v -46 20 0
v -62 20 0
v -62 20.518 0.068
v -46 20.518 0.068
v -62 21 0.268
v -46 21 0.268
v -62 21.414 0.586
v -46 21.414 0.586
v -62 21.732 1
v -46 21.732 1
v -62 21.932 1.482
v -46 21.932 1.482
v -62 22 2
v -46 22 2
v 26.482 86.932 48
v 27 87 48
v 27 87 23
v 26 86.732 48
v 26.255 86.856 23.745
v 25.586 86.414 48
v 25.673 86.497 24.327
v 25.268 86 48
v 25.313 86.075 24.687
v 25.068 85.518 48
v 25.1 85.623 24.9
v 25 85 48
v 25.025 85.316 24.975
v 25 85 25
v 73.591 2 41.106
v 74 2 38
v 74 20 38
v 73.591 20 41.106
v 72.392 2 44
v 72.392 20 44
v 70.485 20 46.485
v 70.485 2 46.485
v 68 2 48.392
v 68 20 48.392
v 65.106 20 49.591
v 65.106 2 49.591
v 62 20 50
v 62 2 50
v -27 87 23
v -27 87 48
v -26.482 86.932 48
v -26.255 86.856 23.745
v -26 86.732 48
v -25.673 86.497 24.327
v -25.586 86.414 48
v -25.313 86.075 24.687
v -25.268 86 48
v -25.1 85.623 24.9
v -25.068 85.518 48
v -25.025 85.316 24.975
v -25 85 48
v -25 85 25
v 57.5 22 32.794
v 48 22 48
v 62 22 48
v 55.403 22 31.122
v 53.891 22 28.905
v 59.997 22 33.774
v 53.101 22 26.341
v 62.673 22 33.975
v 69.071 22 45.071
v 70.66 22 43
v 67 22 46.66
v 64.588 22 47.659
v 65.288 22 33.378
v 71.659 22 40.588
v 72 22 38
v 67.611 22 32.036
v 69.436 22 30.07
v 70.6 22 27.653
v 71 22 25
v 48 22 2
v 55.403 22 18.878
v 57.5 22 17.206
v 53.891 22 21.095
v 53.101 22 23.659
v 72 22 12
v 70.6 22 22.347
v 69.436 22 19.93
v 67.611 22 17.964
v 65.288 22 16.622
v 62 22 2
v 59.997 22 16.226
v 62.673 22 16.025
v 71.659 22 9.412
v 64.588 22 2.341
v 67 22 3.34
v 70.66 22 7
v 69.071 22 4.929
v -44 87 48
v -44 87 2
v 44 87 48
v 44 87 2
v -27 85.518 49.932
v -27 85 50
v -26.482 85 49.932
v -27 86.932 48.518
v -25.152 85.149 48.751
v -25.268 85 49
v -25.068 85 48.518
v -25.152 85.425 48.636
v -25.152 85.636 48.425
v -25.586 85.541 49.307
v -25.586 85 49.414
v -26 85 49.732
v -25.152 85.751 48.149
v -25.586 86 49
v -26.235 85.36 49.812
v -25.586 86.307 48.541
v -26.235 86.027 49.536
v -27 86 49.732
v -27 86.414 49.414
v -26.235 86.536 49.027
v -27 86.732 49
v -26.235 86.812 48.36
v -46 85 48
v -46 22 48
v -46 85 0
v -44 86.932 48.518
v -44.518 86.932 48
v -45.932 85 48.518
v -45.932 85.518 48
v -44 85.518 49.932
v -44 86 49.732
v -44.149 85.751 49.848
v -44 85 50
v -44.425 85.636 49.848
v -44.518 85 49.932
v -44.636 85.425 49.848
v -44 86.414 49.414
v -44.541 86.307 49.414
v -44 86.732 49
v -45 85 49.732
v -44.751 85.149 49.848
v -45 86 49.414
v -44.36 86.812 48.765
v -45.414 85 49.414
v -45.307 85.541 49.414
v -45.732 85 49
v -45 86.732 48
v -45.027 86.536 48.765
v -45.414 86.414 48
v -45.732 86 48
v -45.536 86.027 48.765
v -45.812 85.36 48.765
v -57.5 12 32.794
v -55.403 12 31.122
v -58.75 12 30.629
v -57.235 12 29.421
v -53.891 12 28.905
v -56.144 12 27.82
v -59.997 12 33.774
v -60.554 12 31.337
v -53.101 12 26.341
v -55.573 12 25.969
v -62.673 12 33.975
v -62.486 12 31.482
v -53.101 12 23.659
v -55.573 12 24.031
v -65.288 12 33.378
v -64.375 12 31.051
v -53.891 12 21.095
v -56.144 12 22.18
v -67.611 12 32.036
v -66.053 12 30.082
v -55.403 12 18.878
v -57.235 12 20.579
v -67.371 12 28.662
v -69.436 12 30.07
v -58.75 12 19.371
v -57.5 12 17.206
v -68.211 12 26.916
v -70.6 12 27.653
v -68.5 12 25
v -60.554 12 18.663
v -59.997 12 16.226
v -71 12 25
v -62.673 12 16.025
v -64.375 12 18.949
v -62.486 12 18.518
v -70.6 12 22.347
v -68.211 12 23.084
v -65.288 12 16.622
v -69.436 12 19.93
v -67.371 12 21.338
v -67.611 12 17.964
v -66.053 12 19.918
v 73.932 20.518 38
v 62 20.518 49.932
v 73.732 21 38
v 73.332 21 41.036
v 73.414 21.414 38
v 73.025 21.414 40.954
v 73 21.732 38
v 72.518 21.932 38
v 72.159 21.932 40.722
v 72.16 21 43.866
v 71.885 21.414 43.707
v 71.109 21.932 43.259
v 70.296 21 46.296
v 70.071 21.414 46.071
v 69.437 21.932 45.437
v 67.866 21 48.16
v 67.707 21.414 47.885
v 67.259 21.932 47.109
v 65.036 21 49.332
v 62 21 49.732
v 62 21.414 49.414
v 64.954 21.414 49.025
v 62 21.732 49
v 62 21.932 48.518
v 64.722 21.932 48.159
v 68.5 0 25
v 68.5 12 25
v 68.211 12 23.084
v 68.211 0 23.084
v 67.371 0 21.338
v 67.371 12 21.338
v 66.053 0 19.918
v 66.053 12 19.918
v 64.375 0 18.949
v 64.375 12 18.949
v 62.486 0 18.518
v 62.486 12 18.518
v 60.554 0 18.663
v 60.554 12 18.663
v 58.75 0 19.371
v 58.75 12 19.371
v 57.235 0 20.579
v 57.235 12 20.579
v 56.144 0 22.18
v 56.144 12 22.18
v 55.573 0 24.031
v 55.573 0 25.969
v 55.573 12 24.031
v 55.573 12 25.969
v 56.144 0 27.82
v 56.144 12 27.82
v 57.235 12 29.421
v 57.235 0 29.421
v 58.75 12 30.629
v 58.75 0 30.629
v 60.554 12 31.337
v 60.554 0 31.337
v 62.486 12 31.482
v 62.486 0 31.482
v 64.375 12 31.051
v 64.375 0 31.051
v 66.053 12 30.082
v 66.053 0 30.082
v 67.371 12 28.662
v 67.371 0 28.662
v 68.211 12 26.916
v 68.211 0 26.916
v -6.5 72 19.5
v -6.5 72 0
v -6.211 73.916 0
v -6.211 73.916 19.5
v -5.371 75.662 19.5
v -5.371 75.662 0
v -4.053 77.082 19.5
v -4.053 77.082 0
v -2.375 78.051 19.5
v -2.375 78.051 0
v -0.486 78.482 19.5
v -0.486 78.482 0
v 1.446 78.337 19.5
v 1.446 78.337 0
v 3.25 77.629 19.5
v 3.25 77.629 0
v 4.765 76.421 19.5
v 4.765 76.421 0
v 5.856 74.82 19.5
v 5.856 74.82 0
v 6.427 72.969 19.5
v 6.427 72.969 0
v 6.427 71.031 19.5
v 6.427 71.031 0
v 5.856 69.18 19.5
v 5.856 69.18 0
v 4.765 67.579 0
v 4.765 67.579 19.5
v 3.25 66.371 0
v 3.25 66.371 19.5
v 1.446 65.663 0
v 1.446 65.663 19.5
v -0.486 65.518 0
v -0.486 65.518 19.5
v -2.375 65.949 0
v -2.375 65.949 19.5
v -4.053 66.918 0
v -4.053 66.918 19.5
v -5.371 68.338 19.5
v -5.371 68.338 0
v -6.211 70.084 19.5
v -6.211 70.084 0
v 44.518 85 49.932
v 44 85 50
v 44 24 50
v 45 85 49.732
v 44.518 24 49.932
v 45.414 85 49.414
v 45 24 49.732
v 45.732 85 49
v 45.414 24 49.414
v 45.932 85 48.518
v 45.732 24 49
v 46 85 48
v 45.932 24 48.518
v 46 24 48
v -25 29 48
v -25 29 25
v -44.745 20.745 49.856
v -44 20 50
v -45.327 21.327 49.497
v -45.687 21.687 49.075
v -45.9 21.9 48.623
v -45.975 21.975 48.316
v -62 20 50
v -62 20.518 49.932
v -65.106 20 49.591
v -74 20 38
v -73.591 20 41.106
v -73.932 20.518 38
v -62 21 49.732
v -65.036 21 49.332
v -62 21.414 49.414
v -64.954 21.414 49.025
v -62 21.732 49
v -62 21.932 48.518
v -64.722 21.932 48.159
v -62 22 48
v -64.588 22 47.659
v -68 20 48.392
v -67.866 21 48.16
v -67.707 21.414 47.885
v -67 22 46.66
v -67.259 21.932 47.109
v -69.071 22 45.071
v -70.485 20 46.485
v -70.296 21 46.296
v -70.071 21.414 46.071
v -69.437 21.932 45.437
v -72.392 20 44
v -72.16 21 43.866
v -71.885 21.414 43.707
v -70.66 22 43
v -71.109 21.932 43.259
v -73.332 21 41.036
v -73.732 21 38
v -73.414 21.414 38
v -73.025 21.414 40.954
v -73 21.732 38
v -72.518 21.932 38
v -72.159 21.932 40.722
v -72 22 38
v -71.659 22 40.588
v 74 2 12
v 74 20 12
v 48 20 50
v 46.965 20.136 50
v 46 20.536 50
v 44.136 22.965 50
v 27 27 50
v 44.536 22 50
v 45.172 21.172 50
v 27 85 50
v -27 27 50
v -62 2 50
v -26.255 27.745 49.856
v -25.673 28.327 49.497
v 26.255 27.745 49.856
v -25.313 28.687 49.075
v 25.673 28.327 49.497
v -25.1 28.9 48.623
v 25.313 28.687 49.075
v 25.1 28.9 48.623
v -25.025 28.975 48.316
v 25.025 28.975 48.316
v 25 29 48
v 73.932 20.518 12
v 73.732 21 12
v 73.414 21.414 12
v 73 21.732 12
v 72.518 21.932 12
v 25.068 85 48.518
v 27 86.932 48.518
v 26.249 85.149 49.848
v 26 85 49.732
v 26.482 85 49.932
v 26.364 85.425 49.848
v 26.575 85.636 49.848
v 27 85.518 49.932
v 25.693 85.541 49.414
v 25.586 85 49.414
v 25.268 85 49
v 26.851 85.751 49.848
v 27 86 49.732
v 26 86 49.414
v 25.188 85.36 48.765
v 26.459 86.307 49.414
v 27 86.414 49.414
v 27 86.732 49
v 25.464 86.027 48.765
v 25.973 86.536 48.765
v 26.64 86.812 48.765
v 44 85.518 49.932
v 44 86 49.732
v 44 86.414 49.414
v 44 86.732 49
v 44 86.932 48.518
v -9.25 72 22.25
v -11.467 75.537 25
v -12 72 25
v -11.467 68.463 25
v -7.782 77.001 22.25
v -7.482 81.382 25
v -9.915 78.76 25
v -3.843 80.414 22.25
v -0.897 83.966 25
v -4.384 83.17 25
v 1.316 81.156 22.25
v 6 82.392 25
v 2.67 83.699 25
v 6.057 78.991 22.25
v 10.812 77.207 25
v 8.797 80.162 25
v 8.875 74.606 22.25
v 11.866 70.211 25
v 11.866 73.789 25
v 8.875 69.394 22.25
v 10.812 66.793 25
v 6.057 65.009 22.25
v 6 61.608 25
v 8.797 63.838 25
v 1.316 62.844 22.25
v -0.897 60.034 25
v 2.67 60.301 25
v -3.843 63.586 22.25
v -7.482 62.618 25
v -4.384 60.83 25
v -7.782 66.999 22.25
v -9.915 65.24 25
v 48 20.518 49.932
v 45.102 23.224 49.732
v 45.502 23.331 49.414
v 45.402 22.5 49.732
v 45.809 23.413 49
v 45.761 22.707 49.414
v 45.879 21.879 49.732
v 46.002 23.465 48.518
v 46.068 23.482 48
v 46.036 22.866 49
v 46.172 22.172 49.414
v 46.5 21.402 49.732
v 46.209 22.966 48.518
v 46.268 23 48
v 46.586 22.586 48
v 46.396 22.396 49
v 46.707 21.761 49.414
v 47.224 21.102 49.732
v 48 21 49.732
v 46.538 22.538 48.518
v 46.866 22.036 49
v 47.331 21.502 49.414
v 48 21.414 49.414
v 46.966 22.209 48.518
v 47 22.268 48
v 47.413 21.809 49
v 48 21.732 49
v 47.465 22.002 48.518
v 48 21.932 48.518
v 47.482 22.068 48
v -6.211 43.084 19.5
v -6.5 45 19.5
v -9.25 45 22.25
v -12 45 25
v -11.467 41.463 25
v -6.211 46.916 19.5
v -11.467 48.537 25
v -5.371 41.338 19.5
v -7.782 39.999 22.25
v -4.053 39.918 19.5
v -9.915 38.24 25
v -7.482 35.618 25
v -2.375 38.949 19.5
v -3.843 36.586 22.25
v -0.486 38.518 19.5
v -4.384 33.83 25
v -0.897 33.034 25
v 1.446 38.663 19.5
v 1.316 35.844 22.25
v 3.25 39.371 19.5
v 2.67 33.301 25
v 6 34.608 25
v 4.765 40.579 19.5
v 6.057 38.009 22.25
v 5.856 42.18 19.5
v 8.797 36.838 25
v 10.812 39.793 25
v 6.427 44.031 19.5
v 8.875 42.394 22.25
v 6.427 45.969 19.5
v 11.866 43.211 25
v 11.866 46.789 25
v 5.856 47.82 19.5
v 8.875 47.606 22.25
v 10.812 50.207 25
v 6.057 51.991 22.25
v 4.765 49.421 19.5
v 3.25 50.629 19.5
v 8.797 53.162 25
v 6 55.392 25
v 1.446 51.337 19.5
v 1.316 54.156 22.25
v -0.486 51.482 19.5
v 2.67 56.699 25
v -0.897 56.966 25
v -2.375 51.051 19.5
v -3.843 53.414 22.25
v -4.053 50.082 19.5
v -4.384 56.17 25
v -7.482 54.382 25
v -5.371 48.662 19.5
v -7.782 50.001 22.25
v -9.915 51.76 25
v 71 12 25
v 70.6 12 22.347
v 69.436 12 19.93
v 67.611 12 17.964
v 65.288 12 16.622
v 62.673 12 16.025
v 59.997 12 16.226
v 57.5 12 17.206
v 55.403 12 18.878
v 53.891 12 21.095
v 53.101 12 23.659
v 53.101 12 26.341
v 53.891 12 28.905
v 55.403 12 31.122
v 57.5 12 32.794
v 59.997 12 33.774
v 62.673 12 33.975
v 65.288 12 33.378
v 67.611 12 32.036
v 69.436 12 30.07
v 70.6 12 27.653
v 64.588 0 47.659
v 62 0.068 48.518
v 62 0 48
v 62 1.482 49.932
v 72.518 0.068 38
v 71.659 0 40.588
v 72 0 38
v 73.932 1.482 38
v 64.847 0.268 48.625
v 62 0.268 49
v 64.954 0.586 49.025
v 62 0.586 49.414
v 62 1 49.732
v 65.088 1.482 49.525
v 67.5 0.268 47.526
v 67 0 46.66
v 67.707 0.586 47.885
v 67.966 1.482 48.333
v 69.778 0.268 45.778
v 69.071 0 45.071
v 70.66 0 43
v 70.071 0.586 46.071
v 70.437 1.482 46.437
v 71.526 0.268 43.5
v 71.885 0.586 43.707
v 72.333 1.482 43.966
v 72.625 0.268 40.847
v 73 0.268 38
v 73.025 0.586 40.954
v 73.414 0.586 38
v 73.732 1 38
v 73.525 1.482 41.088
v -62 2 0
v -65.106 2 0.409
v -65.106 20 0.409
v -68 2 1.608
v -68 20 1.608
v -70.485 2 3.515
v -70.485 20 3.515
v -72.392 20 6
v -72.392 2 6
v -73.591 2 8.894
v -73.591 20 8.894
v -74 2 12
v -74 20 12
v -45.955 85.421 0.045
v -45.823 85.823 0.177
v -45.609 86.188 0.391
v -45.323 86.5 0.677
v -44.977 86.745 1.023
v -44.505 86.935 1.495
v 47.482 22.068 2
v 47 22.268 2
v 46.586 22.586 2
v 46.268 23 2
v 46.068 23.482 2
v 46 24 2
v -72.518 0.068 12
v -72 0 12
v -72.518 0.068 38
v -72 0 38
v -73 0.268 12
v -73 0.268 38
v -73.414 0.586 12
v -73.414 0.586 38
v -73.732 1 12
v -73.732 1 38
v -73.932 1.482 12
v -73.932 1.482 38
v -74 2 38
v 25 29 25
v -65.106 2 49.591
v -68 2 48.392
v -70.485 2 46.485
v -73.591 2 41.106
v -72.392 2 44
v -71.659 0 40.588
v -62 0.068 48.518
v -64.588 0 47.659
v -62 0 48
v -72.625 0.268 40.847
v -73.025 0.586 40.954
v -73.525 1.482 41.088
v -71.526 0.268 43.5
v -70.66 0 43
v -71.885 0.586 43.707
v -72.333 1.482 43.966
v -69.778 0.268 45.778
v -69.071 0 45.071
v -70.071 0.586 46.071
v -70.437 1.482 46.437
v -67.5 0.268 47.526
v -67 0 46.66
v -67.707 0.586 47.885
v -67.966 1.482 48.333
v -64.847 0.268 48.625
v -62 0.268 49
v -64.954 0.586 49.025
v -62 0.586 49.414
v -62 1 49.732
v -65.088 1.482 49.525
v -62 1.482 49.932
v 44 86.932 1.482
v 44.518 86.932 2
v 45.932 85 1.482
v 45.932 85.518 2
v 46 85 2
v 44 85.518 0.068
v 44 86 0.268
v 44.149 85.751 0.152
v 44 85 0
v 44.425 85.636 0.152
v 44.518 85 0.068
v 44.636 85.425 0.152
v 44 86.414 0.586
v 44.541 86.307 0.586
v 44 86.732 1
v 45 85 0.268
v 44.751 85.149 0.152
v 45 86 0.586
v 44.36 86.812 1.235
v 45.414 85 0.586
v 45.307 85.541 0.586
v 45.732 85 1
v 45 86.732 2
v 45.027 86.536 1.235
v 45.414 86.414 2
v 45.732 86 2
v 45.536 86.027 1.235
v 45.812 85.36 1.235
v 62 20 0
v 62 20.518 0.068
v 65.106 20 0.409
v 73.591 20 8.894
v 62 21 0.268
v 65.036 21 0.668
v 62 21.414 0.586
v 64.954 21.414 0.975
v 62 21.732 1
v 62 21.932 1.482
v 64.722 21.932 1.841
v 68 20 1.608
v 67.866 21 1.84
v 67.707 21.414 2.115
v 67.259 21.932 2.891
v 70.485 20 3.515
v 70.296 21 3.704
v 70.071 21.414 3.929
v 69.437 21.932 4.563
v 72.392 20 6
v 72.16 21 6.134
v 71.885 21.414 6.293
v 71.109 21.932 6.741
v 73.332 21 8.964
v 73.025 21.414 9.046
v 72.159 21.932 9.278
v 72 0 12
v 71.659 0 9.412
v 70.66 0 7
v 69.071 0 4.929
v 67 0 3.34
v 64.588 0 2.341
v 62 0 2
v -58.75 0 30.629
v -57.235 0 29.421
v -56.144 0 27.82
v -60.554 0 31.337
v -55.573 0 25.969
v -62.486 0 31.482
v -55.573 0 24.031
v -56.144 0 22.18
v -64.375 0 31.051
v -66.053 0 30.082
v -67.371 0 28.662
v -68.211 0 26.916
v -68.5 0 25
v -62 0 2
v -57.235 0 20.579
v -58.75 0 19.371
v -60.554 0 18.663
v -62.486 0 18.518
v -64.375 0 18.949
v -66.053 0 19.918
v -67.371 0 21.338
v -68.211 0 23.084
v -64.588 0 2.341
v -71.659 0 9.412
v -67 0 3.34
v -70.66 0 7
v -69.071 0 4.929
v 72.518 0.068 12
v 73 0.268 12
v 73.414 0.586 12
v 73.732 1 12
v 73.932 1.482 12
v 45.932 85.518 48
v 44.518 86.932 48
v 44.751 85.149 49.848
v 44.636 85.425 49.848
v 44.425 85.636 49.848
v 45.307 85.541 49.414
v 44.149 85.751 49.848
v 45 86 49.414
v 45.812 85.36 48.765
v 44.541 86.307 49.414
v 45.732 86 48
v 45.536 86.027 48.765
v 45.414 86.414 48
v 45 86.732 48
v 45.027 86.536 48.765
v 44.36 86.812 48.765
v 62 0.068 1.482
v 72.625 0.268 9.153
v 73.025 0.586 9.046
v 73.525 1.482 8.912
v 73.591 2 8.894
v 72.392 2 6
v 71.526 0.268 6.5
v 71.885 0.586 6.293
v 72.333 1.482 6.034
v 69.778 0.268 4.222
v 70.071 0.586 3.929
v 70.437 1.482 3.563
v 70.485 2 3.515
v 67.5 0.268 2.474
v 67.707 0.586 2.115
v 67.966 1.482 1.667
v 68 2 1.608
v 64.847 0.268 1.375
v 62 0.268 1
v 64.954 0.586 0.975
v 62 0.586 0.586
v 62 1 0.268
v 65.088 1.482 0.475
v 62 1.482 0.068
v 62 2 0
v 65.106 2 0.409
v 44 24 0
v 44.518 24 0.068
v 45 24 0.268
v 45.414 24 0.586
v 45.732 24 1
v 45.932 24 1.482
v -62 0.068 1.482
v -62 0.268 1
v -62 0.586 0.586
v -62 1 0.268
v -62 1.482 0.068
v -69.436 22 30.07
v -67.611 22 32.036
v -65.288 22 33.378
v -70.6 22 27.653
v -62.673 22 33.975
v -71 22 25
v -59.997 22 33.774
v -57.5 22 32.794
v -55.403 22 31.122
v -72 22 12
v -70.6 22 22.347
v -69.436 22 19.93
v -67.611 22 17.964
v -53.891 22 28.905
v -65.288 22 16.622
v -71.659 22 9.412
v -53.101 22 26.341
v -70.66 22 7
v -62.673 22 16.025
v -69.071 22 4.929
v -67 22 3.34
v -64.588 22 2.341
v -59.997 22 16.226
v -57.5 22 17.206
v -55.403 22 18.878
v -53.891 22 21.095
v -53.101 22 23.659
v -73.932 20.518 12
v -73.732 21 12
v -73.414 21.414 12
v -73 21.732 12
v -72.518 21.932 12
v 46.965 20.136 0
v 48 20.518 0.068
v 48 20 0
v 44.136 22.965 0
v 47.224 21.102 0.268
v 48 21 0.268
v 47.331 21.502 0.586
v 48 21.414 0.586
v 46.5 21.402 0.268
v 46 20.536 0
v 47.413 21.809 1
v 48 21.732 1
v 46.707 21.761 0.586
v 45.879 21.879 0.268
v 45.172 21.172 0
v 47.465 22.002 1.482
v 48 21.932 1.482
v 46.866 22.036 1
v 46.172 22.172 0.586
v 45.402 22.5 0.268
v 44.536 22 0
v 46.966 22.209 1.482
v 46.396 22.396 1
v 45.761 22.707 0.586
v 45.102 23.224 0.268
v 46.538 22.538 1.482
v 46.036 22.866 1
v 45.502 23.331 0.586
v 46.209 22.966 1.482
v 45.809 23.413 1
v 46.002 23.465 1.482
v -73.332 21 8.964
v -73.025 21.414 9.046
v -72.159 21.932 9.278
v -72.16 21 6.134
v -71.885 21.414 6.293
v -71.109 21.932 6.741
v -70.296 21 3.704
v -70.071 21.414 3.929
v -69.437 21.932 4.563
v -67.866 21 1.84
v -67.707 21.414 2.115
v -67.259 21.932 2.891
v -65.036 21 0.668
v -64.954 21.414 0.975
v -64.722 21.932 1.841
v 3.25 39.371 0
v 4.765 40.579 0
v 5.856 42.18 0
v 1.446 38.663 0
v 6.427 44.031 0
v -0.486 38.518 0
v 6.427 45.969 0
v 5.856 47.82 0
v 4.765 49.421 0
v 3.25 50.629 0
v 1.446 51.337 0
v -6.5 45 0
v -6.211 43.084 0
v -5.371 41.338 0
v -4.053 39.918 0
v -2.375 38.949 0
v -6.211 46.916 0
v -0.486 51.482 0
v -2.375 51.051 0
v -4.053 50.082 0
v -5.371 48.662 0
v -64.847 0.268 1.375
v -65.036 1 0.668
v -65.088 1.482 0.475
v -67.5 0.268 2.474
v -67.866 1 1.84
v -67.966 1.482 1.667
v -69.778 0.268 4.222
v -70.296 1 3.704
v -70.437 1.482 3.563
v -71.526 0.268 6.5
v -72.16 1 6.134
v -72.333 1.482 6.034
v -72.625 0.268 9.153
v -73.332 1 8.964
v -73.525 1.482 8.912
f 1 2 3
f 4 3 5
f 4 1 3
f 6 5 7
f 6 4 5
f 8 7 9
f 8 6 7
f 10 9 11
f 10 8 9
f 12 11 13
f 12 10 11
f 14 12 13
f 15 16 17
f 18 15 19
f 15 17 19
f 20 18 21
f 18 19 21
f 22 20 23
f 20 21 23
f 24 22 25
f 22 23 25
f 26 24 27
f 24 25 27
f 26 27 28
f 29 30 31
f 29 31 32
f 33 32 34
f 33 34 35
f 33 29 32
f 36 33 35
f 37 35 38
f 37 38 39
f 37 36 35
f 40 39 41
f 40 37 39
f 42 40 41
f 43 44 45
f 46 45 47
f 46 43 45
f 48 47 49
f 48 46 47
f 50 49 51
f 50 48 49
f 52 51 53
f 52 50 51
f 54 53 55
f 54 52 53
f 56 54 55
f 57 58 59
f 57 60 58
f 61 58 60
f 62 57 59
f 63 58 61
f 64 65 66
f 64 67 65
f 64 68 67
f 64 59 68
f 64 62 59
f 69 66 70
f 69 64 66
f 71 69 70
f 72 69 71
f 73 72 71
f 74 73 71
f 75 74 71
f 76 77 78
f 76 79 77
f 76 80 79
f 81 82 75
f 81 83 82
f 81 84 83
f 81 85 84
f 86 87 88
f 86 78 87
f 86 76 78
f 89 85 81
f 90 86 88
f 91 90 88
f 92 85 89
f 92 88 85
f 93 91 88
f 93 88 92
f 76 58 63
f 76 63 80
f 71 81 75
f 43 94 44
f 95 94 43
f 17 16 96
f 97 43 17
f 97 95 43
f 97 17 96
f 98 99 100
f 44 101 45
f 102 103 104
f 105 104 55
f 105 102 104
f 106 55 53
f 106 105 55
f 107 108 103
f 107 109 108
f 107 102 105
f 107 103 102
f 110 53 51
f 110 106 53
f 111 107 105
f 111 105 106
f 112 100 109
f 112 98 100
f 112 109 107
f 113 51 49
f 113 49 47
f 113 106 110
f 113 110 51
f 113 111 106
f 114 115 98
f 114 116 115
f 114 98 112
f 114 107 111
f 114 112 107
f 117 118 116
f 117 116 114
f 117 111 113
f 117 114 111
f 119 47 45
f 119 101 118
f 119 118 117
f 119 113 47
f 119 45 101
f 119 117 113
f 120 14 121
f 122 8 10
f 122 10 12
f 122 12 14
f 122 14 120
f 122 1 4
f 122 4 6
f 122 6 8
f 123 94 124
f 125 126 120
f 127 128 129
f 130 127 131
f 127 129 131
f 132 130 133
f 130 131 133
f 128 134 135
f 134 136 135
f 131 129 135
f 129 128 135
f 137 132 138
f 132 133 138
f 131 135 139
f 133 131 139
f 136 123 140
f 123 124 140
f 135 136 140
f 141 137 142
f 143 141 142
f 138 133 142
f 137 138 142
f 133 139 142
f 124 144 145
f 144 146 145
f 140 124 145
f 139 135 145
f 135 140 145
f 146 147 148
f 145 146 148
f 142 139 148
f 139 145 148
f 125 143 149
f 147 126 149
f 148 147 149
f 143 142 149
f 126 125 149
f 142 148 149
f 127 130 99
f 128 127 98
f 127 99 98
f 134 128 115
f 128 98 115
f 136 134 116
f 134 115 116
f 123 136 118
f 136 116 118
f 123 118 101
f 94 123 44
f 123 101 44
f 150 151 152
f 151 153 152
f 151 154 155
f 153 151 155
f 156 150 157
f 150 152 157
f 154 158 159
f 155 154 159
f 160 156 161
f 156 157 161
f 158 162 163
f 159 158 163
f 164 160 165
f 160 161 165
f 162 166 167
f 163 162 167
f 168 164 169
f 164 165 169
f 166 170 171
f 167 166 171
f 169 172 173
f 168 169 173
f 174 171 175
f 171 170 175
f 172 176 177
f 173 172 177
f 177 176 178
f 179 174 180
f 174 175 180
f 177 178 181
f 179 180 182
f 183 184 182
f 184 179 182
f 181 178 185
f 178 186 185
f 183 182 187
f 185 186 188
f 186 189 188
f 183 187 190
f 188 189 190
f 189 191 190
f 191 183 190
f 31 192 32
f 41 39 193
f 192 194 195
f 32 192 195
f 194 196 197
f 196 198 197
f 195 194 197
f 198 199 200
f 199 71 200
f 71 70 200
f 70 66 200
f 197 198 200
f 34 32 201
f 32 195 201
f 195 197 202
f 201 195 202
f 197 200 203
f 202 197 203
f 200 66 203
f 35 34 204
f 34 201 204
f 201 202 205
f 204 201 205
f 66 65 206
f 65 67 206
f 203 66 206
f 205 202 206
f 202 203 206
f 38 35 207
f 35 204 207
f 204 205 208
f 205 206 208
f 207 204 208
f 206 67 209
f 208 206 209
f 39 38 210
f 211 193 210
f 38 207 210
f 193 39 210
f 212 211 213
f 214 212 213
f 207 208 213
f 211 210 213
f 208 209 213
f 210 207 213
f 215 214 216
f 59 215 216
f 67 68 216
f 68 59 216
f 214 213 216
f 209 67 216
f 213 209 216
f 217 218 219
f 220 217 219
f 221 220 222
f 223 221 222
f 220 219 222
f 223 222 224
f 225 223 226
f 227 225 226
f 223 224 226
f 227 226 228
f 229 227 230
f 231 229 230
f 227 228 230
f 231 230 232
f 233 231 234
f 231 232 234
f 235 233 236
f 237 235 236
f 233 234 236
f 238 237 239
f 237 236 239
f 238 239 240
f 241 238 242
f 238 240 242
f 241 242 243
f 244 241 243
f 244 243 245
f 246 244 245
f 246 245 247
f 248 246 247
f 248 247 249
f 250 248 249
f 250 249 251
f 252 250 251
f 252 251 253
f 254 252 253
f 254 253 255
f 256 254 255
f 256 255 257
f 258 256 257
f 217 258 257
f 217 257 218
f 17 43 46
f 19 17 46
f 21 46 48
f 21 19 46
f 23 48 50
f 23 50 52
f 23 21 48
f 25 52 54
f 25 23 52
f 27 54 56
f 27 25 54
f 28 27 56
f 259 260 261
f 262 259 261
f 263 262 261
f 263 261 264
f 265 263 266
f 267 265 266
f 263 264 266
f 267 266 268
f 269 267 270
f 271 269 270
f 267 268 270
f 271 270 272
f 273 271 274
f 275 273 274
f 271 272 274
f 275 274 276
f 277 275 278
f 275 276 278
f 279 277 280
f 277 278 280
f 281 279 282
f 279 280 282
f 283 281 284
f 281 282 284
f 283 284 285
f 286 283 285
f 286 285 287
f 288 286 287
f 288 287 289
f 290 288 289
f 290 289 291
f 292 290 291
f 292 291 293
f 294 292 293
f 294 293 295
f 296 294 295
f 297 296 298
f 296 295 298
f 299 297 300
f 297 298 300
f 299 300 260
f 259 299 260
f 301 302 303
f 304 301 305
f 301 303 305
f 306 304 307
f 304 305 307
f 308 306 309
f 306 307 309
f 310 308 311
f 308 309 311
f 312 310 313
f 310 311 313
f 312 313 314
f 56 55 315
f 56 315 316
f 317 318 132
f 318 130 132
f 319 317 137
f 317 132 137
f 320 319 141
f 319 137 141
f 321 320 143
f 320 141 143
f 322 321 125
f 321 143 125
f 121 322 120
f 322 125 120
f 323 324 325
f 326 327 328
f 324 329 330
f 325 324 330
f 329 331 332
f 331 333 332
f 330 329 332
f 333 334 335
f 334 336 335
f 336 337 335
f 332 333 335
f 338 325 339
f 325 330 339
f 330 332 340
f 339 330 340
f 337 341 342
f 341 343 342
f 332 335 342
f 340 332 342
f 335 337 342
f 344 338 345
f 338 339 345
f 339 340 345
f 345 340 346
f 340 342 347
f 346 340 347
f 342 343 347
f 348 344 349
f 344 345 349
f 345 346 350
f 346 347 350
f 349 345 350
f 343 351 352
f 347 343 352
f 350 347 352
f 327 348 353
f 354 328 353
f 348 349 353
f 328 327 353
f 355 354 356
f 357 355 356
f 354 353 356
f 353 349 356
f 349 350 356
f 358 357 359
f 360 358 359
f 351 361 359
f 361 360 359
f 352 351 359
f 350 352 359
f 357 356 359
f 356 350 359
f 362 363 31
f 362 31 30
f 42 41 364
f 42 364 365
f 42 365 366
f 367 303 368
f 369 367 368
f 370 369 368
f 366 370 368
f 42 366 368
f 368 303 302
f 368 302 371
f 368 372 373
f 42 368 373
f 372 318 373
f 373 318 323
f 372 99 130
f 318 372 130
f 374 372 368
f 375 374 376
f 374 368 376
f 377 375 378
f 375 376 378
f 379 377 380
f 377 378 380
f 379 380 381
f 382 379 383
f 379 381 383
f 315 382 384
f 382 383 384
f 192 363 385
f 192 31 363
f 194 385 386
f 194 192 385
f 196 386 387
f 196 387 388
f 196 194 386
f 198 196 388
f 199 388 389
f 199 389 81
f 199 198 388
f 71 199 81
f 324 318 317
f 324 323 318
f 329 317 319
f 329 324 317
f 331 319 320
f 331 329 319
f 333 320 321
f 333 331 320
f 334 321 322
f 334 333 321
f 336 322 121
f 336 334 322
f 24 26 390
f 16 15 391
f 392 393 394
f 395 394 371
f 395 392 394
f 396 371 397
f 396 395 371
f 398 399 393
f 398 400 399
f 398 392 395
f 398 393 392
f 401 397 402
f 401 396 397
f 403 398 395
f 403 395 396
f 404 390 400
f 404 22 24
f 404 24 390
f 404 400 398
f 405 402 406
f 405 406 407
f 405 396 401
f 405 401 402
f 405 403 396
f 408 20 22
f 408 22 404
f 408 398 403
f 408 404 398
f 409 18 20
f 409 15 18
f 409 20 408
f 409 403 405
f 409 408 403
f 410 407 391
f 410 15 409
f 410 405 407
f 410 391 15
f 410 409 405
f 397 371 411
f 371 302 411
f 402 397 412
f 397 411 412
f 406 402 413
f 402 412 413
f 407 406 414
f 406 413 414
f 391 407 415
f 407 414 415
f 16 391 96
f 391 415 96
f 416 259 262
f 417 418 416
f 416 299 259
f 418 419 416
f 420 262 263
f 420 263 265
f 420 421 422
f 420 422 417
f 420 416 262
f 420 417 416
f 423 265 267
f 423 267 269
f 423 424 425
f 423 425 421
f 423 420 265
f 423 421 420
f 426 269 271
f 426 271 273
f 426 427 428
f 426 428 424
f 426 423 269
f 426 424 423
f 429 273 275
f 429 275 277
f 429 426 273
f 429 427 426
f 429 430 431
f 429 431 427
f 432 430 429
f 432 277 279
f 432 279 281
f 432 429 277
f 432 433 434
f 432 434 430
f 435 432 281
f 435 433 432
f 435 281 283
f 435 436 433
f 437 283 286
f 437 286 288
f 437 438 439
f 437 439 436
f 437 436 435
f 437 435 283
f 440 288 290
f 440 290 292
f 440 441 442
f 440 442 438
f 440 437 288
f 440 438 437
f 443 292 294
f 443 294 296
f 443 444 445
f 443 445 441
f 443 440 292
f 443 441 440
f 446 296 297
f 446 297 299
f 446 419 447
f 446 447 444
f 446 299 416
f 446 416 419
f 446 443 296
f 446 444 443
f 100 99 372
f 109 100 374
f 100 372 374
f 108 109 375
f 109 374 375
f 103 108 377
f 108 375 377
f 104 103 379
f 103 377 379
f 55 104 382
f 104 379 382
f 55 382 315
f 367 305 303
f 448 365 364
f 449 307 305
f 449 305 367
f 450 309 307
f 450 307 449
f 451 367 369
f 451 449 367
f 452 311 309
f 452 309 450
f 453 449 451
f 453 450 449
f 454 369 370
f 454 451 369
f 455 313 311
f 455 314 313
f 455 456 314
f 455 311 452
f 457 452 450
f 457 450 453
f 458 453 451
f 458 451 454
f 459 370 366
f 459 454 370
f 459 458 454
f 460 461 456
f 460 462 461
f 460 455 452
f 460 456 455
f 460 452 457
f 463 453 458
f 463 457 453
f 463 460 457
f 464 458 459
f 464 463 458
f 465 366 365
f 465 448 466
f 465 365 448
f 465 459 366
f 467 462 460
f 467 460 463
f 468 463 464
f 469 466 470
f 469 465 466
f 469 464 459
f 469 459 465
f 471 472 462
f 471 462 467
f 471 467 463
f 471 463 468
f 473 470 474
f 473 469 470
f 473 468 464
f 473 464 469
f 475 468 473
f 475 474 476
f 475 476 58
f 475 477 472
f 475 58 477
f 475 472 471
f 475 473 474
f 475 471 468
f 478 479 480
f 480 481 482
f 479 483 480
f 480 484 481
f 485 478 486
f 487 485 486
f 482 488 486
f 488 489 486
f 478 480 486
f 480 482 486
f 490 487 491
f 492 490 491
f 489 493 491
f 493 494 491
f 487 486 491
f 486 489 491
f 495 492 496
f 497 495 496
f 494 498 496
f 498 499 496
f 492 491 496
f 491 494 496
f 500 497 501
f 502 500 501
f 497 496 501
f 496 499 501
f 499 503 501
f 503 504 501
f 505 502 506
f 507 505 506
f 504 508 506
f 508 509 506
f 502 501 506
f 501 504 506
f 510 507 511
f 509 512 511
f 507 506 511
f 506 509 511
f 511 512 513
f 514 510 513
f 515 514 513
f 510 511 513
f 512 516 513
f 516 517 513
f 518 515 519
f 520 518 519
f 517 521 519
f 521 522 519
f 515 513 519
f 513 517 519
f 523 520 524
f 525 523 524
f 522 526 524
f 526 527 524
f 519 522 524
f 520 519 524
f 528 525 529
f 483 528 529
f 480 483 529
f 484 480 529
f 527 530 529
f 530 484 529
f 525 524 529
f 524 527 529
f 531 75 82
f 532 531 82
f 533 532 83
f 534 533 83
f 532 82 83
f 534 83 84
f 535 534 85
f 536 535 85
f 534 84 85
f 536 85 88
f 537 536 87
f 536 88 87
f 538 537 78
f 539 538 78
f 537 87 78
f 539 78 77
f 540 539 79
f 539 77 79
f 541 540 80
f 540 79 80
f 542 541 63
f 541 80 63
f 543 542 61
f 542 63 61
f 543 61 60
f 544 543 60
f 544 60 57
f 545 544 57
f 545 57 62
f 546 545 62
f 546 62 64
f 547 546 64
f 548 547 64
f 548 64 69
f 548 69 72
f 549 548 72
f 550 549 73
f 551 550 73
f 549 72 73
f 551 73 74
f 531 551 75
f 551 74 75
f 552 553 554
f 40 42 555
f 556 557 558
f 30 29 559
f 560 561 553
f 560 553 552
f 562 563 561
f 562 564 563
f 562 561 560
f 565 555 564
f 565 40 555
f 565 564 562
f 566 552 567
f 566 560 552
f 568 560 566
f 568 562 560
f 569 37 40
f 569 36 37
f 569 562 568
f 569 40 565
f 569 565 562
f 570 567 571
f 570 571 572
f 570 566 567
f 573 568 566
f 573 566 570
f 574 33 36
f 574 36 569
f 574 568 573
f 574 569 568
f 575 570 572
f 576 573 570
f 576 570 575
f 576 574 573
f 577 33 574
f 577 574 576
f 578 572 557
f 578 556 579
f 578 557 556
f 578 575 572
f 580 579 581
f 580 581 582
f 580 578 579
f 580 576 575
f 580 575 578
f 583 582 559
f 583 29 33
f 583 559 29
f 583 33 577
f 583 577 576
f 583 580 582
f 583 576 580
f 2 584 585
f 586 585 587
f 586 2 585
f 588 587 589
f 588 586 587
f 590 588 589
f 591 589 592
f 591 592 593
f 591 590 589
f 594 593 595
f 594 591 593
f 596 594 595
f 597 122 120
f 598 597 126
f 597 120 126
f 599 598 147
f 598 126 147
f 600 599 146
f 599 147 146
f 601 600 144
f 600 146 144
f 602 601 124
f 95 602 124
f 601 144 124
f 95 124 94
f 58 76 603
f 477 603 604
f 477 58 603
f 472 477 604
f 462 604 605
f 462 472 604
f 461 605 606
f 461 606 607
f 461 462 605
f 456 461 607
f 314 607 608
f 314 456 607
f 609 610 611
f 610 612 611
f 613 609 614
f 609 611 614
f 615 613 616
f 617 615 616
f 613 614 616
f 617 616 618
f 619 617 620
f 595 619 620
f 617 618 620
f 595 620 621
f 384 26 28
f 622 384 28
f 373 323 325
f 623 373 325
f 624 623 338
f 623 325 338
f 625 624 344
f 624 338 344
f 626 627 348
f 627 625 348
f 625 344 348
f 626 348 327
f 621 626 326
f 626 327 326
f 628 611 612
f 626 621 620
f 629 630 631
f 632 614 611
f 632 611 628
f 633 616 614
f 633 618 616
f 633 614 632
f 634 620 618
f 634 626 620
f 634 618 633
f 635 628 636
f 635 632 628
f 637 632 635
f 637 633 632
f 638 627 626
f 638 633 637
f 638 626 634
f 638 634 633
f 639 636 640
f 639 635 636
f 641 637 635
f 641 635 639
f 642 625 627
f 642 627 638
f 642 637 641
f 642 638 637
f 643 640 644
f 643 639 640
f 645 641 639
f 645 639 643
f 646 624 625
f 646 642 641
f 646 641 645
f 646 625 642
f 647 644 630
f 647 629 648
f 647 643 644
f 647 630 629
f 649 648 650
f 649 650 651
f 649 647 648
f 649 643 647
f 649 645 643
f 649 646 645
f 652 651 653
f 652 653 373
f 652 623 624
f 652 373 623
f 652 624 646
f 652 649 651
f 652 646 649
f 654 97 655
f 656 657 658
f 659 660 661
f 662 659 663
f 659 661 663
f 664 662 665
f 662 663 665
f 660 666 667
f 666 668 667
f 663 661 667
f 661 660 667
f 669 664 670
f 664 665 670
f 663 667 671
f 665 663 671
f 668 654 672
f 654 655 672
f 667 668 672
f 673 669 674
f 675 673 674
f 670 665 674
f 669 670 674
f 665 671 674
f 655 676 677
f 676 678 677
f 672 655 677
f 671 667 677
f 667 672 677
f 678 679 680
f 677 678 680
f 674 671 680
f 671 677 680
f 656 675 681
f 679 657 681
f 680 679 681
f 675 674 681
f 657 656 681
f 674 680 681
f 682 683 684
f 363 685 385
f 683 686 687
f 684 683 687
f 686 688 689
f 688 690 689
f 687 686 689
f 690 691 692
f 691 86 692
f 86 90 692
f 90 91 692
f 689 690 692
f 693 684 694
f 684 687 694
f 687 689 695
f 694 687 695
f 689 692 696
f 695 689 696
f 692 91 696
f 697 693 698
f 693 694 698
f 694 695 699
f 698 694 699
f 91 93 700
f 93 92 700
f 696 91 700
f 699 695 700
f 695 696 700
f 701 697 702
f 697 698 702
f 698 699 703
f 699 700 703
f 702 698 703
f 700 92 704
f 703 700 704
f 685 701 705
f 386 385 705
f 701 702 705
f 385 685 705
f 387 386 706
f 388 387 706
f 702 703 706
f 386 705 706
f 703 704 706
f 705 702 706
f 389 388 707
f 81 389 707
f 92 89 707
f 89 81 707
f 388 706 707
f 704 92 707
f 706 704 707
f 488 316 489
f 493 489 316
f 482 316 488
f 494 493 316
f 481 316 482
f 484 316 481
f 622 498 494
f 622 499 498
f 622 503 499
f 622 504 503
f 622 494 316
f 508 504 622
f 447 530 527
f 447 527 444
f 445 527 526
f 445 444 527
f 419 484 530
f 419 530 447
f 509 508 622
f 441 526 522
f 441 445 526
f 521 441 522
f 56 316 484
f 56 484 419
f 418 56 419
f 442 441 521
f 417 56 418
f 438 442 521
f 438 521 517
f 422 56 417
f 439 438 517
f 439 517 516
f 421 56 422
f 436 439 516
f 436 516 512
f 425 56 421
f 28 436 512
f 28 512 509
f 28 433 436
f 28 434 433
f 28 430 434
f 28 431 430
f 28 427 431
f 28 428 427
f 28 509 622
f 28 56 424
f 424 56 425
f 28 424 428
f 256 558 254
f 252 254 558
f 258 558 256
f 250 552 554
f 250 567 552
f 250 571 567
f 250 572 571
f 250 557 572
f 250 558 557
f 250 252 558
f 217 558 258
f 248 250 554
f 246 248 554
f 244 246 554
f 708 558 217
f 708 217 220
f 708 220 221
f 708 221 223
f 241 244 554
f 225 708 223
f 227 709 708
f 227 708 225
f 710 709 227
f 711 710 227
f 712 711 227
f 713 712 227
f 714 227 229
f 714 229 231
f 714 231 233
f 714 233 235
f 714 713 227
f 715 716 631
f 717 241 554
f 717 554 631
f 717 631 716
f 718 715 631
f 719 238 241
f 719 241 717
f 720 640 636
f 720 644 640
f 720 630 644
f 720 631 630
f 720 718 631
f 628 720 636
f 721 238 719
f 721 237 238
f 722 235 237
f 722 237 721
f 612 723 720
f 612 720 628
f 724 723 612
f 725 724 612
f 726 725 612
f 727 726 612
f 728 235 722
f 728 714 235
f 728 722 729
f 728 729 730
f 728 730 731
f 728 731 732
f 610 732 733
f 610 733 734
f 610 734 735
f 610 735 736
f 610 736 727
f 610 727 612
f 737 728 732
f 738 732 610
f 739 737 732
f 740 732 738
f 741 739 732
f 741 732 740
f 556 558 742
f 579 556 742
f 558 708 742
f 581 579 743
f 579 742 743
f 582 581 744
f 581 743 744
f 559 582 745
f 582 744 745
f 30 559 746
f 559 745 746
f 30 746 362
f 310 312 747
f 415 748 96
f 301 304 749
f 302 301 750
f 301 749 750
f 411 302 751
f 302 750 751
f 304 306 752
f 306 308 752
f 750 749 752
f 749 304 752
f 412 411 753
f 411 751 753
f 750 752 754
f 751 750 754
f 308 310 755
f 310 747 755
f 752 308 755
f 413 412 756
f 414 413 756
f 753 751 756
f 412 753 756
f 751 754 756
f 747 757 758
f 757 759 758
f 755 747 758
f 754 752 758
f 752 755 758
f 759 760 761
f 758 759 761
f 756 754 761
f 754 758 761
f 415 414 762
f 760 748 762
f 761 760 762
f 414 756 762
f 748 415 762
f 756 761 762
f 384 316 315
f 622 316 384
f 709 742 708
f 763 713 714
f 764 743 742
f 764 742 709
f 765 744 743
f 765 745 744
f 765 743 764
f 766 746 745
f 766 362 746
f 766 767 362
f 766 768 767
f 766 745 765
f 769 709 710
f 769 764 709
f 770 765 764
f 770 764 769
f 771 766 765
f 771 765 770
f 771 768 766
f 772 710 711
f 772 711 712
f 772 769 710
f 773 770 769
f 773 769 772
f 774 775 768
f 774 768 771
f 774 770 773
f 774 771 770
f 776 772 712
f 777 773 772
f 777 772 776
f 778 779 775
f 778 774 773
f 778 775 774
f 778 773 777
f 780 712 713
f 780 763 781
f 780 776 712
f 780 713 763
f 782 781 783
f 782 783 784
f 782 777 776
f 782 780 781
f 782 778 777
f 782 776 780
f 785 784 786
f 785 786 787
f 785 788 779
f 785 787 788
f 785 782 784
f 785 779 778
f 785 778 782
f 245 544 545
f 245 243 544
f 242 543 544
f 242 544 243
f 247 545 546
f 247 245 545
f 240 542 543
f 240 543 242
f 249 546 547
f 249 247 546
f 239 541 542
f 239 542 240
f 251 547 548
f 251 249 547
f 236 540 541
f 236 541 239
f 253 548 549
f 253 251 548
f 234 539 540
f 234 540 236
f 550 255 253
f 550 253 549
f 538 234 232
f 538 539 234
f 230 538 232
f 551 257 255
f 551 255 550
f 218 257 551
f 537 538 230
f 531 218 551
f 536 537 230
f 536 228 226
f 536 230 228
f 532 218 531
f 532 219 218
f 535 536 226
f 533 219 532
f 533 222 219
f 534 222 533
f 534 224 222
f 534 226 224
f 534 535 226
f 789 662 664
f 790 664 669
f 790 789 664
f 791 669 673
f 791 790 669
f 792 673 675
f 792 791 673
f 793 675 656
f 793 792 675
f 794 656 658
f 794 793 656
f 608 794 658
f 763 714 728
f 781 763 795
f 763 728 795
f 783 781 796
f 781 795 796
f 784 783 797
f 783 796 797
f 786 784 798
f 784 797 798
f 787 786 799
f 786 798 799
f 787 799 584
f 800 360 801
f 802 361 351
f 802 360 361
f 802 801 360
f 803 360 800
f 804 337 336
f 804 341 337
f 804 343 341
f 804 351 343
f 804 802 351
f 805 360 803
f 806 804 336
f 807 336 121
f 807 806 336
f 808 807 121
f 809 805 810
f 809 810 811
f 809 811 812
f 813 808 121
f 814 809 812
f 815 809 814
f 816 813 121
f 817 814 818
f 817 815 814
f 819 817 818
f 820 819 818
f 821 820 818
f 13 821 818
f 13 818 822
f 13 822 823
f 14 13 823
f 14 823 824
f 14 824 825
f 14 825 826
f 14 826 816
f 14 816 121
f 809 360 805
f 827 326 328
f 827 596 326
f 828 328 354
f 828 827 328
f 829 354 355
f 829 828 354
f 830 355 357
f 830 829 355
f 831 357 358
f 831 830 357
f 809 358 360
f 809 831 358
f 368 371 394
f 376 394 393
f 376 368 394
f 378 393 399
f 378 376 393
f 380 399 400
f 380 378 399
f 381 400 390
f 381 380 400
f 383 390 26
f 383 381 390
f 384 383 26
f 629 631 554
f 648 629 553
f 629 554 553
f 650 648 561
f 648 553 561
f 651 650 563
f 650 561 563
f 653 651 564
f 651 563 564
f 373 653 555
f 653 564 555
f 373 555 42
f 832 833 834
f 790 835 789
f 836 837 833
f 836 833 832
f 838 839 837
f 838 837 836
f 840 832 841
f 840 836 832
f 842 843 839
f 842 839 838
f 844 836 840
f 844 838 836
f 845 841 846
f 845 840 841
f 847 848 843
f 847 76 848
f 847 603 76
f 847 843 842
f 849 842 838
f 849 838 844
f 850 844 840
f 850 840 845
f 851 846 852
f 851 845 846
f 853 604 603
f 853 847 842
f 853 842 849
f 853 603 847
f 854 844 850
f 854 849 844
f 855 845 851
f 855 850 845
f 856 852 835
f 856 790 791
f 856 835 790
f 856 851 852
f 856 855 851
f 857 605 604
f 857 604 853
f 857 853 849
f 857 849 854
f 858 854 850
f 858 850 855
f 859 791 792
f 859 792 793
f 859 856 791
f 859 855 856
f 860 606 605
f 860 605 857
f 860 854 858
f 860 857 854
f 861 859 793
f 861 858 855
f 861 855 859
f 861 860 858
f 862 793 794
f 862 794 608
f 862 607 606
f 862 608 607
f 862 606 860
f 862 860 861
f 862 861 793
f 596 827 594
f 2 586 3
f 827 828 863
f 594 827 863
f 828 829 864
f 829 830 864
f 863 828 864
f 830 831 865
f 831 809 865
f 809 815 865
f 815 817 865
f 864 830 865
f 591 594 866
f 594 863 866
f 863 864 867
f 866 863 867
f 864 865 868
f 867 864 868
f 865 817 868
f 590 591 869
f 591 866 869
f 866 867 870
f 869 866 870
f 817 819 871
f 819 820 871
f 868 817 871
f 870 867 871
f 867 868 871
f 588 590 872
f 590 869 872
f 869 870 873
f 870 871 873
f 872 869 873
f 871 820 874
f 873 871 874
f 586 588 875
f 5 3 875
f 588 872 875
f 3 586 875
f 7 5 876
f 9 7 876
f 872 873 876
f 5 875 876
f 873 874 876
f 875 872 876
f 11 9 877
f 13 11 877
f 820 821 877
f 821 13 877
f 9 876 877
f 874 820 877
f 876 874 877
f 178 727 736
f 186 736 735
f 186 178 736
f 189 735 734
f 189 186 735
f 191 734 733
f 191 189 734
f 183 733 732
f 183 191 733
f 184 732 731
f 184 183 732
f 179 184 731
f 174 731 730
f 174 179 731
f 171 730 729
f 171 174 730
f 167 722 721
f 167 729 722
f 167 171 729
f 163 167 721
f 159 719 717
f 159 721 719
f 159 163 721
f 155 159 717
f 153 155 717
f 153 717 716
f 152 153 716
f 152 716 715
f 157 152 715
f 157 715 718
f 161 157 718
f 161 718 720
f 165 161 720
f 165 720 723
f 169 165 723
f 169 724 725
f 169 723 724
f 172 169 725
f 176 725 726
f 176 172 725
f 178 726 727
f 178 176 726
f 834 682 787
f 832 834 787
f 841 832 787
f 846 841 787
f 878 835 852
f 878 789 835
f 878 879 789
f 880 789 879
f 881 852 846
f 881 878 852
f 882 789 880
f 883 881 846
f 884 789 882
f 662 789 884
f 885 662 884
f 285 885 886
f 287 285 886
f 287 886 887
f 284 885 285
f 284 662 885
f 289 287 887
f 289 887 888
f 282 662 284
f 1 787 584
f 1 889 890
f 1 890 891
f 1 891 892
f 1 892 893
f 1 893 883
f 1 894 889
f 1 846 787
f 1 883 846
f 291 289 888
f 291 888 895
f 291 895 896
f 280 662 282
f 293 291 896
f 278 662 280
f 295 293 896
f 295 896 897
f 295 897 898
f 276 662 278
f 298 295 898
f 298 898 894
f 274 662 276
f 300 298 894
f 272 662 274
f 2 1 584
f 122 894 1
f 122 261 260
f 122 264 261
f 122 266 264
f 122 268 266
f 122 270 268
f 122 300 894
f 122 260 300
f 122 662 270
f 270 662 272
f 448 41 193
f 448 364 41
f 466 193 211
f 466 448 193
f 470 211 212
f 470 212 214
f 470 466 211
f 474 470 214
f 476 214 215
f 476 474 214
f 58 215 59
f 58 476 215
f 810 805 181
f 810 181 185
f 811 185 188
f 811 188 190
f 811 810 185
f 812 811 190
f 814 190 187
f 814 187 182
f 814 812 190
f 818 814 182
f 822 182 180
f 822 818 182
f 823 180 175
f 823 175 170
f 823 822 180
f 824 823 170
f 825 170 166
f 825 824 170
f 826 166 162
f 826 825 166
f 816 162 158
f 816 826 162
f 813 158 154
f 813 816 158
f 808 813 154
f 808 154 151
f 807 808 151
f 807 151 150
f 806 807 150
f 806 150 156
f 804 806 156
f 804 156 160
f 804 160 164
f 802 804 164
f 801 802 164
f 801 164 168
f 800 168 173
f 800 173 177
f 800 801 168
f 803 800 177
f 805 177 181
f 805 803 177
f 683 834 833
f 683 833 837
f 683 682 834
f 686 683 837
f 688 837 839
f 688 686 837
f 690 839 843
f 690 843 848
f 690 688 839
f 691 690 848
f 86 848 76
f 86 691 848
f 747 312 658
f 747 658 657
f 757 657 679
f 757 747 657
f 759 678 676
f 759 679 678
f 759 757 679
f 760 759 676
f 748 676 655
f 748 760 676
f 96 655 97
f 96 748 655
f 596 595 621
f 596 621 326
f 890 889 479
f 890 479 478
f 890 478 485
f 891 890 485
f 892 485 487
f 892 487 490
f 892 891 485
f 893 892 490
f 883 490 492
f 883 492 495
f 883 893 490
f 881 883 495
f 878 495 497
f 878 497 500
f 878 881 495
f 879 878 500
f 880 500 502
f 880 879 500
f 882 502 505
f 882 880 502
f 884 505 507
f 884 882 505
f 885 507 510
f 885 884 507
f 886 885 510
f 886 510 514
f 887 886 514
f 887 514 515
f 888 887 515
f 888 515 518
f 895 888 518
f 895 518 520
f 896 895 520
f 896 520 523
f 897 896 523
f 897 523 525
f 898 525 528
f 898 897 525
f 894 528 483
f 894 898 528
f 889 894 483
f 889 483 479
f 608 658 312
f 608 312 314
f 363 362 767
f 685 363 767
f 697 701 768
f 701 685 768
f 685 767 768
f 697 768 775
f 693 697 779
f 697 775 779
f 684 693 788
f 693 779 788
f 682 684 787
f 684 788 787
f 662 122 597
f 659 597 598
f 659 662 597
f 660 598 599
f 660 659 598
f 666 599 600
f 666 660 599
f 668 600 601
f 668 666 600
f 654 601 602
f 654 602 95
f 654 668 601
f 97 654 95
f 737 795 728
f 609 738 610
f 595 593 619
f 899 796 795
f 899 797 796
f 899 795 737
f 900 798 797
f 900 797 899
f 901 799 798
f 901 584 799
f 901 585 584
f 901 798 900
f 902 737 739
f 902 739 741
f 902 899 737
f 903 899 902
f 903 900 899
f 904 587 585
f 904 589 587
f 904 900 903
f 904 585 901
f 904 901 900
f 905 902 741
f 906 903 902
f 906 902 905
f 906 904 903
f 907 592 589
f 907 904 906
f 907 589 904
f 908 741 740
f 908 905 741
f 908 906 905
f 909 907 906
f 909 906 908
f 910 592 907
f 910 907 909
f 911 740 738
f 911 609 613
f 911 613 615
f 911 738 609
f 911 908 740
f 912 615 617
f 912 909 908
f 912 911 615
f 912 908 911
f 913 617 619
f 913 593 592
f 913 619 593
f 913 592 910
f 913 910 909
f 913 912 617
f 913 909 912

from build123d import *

# Parameters (mm, degrees)
BOSS_EXTRUDE1_DEPTH     = 50
SKETCH2_W               = 50
SKETCH2_H               = 25
CUT_EXTRUDE2_DEPTH      = 58
SKETCH3_R               = 6.5
CUT_EXTRUDE3_DEPTH      = 58
SKETCH3_3_R             = 9
SKETCH3_3_R_2           = 6.5
CUT_EXTRUDE4_DEPTH      = 10
SKETCH6_R               = 6.5
CUT_EXTRUDE5_DEPTH      = 19.5
CUT_EXTRUDE9_START      = -19.5
SKETCH6_3_R             = 6.5
CUT_EXTRUDE9_DEPTH      = 8.5
CUT_EXTRUDE9_DRAFT      = 45
MIRROR3_START           = -19.5
MIRROR3_COPY_1_SKETCH_R = 6.5
MIRROR3_COPY_1_DEPTH    = 8.5
MIRROR3_COPY_1_DRAFT    = 45
FILLET1_R               = 12
FILLET2_R               = 2


with BuildPart() as part:
    # Sketch1 → Boss-Extrude1 (new body)
    with BuildSketch(Plane.XY):
        Polygon((74, 0), (-74, 0), (-74, 22), (-46, 22), (-46, 87), (46, 87), (46, 22), (74, 22), align=None)
    extrude(amount=BOSS_EXTRUDE1_DEPTH)

    # Sketch2 → Cut-Extrude2 (cut)
    with BuildSketch(Plane(origin=(0, 87, 0), x_dir=(1, 0, 0), z_dir=(0, 1, 0))):
        with Locations((0, -37.5)):
            Rectangle(SKETCH2_W, SKETCH2_H)
    extrude(amount=-CUT_EXTRUDE2_DEPTH, mode=Mode.SUBTRACT)

    # Sketch3 → Cut-Extrude3 (cut)
    with BuildSketch(Plane(origin=(0, 22, 0), x_dir=(1, 0, 0), z_dir=(0, 1, 0))):
        with Locations((62, -25)):
            Circle(SKETCH3_R)
    cut_extrude3 = extrude(amount=-CUT_EXTRUDE3_DEPTH, mode=Mode.SUBTRACT)

    # Sketch3<3> → Cut-Extrude4 (cut)
    with BuildSketch(Plane(origin=(0, 22, 0), x_dir=(1, 0, 0), z_dir=(0, 1, 0))):
        with Locations((62, -25)):
            Circle(SKETCH3_3_R)
        with Locations((62, -25)):
            Circle(SKETCH3_3_R_2, mode=Mode.SUBTRACT)
    cut_extrude4 = extrude(amount=-CUT_EXTRUDE4_DEPTH, mode=Mode.SUBTRACT)

    # Mirror2: Cut-Extrude3, Cut-Extrude4 across plane
    add(cut_extrude3.mirror(Plane(origin=(0, 0, 0), x_dir=(0, 0, 1), z_dir=(1, 0, 0))), mode=Mode.SUBTRACT)
    add(cut_extrude4.mirror(Plane(origin=(0, 0, 0), x_dir=(0, 0, 1), z_dir=(1, 0, 0))), mode=Mode.SUBTRACT)

    # Sketch6 → Cut-Extrude5 (cut)
    with BuildSketch(Plane(origin=(0, 0, 0), x_dir=(-1, 0, 0), z_dir=(0, 0, -1))):
        with Locations((0, 72)):
            Circle(SKETCH6_R)
    cut_extrude5 = extrude(amount=-CUT_EXTRUDE5_DEPTH, mode=Mode.SUBTRACT)


with BuildPart() as cut_extrude9_tool:
    # Sketch6<3> → Cut-Extrude9 (with draft: the straight prism first)
    with BuildSketch(Plane(origin=(0, 0, 0), x_dir=(-1, 0, 0), z_dir=(0, 0, -1)).offset(CUT_EXTRUDE9_START)):
        with Locations((0, 72)):
            Circle(SKETCH6_3_R)
    extrude(amount=-CUT_EXTRUDE9_DEPTH)
    # Cut-Extrude9: the draft: its side faces are tilted about the plane it starts from
    cut_extrude9_sides = [cut_extrude9_tool.faces().sort_by_distance(p)[0] for p in [
        (6.5, 72, 23.75),
    ]]
    draft(cut_extrude9_sides, Plane(origin=(0, 0, 0), x_dir=(-1, 0, 0), z_dir=(0, 0, -1)).offset(CUT_EXTRUDE9_START), CUT_EXTRUDE9_DRAFT)


with BuildPart() as part_1:
    add(part.part)

    # Cut-Extrude9: cut by cut_extrude9_tool
    add(cut_extrude9_tool.part, mode=Mode.SUBTRACT)

    # Mirror3: Cut-Extrude5 across plane
    add(cut_extrude5.mirror(Plane.ZX.offset(58.5)), mode=Mode.SUBTRACT)


with BuildPart() as mirror3_copy_1_tool:
    # Mirror3 copy 1 sketch → Mirror3 copy 1 (with draft: the straight prism first)
    with BuildSketch(Plane(origin=(0, 117, 0), x_dir=(-1, 0, 0), z_dir=(0, 0, -1)).offset(MIRROR3_START)):
        with Locations((0, -72)):
            Circle(MIRROR3_COPY_1_SKETCH_R)
    extrude(amount=-MIRROR3_COPY_1_DEPTH)
    # Mirror3 copy 1: the draft: its side faces are tilted about the plane it starts from
    mirror3_copy_1_sides = [mirror3_copy_1_tool.faces().sort_by_distance(p)[0] for p in [
        (6.5, 45, 23.75),
    ]]
    draft(mirror3_copy_1_sides, Plane(origin=(0, 117, 0), x_dir=(-1, 0, 0), z_dir=(0, 0, -1)).offset(MIRROR3_START), MIRROR3_COPY_1_DRAFT)


with BuildPart() as part_2:
    add(part_1.part)

    # Mirror3 copy 1: cut by mirror3_copy_1_tool
    add(mirror3_copy_1_tool.part, mode=Mode.SUBTRACT)

    # Fillet1
    fillet1_edges = [part_2.edges().sort_by_distance(p)[0] for p in [
        (-74, 11, 0),
        (-74, 11, 50),
        (74, 11, 0),
        (74, 11, 50),
    ]]
    fillet(fillet1_edges, radius=FILLET1_R)

    # Fillet2
    fillet2_edges = [part_2.edges().sort_by_distance(p)[0] for p in [
        (54, 22, 0),
        (70.485281374, 22, 3.514718626),
        (74, 22, 25),
        (70.485281374, 22, 46.485281374),
        (-70.485281374, 0, 46.485281374),
        (-74, 0, 25),
        (-70.485281374, 0, 3.514718626),
        (0, 0, 0),
        (70.485281374, 0, 3.514718626),
        (74, 0, 25),
        (70.485281374, 0, 46.485281374),
        (-54, 22, 0),
        (-70.485281374, 22, 3.514718626),
        (-74, 22, 25),
        (-70.485281374, 22, 46.485281374),
        (46, 22, 25),
        (46, 54.5, 0),
        (-46, 54.5, 50),
        (-25, 58, 50),
        (0, 29, 50),
        (25, 58, 50),
        (46, 54.5, 50),
        (54, 22, 50),
        (0, 0, 50),
        (-54, 22, 50),
        (0, 87, 25),
        (-25, 87, 37.5),
        (-35.5, 87, 50),
        (-46, 87, 25),
        (0, 87, 0),
        (46, 87, 25),
        (35.5, 87, 50),
        (25, 87, 37.5),
    ]]
    fillet(fillet2_edges, radius=FILLET2_R)


solid = part_2.part
